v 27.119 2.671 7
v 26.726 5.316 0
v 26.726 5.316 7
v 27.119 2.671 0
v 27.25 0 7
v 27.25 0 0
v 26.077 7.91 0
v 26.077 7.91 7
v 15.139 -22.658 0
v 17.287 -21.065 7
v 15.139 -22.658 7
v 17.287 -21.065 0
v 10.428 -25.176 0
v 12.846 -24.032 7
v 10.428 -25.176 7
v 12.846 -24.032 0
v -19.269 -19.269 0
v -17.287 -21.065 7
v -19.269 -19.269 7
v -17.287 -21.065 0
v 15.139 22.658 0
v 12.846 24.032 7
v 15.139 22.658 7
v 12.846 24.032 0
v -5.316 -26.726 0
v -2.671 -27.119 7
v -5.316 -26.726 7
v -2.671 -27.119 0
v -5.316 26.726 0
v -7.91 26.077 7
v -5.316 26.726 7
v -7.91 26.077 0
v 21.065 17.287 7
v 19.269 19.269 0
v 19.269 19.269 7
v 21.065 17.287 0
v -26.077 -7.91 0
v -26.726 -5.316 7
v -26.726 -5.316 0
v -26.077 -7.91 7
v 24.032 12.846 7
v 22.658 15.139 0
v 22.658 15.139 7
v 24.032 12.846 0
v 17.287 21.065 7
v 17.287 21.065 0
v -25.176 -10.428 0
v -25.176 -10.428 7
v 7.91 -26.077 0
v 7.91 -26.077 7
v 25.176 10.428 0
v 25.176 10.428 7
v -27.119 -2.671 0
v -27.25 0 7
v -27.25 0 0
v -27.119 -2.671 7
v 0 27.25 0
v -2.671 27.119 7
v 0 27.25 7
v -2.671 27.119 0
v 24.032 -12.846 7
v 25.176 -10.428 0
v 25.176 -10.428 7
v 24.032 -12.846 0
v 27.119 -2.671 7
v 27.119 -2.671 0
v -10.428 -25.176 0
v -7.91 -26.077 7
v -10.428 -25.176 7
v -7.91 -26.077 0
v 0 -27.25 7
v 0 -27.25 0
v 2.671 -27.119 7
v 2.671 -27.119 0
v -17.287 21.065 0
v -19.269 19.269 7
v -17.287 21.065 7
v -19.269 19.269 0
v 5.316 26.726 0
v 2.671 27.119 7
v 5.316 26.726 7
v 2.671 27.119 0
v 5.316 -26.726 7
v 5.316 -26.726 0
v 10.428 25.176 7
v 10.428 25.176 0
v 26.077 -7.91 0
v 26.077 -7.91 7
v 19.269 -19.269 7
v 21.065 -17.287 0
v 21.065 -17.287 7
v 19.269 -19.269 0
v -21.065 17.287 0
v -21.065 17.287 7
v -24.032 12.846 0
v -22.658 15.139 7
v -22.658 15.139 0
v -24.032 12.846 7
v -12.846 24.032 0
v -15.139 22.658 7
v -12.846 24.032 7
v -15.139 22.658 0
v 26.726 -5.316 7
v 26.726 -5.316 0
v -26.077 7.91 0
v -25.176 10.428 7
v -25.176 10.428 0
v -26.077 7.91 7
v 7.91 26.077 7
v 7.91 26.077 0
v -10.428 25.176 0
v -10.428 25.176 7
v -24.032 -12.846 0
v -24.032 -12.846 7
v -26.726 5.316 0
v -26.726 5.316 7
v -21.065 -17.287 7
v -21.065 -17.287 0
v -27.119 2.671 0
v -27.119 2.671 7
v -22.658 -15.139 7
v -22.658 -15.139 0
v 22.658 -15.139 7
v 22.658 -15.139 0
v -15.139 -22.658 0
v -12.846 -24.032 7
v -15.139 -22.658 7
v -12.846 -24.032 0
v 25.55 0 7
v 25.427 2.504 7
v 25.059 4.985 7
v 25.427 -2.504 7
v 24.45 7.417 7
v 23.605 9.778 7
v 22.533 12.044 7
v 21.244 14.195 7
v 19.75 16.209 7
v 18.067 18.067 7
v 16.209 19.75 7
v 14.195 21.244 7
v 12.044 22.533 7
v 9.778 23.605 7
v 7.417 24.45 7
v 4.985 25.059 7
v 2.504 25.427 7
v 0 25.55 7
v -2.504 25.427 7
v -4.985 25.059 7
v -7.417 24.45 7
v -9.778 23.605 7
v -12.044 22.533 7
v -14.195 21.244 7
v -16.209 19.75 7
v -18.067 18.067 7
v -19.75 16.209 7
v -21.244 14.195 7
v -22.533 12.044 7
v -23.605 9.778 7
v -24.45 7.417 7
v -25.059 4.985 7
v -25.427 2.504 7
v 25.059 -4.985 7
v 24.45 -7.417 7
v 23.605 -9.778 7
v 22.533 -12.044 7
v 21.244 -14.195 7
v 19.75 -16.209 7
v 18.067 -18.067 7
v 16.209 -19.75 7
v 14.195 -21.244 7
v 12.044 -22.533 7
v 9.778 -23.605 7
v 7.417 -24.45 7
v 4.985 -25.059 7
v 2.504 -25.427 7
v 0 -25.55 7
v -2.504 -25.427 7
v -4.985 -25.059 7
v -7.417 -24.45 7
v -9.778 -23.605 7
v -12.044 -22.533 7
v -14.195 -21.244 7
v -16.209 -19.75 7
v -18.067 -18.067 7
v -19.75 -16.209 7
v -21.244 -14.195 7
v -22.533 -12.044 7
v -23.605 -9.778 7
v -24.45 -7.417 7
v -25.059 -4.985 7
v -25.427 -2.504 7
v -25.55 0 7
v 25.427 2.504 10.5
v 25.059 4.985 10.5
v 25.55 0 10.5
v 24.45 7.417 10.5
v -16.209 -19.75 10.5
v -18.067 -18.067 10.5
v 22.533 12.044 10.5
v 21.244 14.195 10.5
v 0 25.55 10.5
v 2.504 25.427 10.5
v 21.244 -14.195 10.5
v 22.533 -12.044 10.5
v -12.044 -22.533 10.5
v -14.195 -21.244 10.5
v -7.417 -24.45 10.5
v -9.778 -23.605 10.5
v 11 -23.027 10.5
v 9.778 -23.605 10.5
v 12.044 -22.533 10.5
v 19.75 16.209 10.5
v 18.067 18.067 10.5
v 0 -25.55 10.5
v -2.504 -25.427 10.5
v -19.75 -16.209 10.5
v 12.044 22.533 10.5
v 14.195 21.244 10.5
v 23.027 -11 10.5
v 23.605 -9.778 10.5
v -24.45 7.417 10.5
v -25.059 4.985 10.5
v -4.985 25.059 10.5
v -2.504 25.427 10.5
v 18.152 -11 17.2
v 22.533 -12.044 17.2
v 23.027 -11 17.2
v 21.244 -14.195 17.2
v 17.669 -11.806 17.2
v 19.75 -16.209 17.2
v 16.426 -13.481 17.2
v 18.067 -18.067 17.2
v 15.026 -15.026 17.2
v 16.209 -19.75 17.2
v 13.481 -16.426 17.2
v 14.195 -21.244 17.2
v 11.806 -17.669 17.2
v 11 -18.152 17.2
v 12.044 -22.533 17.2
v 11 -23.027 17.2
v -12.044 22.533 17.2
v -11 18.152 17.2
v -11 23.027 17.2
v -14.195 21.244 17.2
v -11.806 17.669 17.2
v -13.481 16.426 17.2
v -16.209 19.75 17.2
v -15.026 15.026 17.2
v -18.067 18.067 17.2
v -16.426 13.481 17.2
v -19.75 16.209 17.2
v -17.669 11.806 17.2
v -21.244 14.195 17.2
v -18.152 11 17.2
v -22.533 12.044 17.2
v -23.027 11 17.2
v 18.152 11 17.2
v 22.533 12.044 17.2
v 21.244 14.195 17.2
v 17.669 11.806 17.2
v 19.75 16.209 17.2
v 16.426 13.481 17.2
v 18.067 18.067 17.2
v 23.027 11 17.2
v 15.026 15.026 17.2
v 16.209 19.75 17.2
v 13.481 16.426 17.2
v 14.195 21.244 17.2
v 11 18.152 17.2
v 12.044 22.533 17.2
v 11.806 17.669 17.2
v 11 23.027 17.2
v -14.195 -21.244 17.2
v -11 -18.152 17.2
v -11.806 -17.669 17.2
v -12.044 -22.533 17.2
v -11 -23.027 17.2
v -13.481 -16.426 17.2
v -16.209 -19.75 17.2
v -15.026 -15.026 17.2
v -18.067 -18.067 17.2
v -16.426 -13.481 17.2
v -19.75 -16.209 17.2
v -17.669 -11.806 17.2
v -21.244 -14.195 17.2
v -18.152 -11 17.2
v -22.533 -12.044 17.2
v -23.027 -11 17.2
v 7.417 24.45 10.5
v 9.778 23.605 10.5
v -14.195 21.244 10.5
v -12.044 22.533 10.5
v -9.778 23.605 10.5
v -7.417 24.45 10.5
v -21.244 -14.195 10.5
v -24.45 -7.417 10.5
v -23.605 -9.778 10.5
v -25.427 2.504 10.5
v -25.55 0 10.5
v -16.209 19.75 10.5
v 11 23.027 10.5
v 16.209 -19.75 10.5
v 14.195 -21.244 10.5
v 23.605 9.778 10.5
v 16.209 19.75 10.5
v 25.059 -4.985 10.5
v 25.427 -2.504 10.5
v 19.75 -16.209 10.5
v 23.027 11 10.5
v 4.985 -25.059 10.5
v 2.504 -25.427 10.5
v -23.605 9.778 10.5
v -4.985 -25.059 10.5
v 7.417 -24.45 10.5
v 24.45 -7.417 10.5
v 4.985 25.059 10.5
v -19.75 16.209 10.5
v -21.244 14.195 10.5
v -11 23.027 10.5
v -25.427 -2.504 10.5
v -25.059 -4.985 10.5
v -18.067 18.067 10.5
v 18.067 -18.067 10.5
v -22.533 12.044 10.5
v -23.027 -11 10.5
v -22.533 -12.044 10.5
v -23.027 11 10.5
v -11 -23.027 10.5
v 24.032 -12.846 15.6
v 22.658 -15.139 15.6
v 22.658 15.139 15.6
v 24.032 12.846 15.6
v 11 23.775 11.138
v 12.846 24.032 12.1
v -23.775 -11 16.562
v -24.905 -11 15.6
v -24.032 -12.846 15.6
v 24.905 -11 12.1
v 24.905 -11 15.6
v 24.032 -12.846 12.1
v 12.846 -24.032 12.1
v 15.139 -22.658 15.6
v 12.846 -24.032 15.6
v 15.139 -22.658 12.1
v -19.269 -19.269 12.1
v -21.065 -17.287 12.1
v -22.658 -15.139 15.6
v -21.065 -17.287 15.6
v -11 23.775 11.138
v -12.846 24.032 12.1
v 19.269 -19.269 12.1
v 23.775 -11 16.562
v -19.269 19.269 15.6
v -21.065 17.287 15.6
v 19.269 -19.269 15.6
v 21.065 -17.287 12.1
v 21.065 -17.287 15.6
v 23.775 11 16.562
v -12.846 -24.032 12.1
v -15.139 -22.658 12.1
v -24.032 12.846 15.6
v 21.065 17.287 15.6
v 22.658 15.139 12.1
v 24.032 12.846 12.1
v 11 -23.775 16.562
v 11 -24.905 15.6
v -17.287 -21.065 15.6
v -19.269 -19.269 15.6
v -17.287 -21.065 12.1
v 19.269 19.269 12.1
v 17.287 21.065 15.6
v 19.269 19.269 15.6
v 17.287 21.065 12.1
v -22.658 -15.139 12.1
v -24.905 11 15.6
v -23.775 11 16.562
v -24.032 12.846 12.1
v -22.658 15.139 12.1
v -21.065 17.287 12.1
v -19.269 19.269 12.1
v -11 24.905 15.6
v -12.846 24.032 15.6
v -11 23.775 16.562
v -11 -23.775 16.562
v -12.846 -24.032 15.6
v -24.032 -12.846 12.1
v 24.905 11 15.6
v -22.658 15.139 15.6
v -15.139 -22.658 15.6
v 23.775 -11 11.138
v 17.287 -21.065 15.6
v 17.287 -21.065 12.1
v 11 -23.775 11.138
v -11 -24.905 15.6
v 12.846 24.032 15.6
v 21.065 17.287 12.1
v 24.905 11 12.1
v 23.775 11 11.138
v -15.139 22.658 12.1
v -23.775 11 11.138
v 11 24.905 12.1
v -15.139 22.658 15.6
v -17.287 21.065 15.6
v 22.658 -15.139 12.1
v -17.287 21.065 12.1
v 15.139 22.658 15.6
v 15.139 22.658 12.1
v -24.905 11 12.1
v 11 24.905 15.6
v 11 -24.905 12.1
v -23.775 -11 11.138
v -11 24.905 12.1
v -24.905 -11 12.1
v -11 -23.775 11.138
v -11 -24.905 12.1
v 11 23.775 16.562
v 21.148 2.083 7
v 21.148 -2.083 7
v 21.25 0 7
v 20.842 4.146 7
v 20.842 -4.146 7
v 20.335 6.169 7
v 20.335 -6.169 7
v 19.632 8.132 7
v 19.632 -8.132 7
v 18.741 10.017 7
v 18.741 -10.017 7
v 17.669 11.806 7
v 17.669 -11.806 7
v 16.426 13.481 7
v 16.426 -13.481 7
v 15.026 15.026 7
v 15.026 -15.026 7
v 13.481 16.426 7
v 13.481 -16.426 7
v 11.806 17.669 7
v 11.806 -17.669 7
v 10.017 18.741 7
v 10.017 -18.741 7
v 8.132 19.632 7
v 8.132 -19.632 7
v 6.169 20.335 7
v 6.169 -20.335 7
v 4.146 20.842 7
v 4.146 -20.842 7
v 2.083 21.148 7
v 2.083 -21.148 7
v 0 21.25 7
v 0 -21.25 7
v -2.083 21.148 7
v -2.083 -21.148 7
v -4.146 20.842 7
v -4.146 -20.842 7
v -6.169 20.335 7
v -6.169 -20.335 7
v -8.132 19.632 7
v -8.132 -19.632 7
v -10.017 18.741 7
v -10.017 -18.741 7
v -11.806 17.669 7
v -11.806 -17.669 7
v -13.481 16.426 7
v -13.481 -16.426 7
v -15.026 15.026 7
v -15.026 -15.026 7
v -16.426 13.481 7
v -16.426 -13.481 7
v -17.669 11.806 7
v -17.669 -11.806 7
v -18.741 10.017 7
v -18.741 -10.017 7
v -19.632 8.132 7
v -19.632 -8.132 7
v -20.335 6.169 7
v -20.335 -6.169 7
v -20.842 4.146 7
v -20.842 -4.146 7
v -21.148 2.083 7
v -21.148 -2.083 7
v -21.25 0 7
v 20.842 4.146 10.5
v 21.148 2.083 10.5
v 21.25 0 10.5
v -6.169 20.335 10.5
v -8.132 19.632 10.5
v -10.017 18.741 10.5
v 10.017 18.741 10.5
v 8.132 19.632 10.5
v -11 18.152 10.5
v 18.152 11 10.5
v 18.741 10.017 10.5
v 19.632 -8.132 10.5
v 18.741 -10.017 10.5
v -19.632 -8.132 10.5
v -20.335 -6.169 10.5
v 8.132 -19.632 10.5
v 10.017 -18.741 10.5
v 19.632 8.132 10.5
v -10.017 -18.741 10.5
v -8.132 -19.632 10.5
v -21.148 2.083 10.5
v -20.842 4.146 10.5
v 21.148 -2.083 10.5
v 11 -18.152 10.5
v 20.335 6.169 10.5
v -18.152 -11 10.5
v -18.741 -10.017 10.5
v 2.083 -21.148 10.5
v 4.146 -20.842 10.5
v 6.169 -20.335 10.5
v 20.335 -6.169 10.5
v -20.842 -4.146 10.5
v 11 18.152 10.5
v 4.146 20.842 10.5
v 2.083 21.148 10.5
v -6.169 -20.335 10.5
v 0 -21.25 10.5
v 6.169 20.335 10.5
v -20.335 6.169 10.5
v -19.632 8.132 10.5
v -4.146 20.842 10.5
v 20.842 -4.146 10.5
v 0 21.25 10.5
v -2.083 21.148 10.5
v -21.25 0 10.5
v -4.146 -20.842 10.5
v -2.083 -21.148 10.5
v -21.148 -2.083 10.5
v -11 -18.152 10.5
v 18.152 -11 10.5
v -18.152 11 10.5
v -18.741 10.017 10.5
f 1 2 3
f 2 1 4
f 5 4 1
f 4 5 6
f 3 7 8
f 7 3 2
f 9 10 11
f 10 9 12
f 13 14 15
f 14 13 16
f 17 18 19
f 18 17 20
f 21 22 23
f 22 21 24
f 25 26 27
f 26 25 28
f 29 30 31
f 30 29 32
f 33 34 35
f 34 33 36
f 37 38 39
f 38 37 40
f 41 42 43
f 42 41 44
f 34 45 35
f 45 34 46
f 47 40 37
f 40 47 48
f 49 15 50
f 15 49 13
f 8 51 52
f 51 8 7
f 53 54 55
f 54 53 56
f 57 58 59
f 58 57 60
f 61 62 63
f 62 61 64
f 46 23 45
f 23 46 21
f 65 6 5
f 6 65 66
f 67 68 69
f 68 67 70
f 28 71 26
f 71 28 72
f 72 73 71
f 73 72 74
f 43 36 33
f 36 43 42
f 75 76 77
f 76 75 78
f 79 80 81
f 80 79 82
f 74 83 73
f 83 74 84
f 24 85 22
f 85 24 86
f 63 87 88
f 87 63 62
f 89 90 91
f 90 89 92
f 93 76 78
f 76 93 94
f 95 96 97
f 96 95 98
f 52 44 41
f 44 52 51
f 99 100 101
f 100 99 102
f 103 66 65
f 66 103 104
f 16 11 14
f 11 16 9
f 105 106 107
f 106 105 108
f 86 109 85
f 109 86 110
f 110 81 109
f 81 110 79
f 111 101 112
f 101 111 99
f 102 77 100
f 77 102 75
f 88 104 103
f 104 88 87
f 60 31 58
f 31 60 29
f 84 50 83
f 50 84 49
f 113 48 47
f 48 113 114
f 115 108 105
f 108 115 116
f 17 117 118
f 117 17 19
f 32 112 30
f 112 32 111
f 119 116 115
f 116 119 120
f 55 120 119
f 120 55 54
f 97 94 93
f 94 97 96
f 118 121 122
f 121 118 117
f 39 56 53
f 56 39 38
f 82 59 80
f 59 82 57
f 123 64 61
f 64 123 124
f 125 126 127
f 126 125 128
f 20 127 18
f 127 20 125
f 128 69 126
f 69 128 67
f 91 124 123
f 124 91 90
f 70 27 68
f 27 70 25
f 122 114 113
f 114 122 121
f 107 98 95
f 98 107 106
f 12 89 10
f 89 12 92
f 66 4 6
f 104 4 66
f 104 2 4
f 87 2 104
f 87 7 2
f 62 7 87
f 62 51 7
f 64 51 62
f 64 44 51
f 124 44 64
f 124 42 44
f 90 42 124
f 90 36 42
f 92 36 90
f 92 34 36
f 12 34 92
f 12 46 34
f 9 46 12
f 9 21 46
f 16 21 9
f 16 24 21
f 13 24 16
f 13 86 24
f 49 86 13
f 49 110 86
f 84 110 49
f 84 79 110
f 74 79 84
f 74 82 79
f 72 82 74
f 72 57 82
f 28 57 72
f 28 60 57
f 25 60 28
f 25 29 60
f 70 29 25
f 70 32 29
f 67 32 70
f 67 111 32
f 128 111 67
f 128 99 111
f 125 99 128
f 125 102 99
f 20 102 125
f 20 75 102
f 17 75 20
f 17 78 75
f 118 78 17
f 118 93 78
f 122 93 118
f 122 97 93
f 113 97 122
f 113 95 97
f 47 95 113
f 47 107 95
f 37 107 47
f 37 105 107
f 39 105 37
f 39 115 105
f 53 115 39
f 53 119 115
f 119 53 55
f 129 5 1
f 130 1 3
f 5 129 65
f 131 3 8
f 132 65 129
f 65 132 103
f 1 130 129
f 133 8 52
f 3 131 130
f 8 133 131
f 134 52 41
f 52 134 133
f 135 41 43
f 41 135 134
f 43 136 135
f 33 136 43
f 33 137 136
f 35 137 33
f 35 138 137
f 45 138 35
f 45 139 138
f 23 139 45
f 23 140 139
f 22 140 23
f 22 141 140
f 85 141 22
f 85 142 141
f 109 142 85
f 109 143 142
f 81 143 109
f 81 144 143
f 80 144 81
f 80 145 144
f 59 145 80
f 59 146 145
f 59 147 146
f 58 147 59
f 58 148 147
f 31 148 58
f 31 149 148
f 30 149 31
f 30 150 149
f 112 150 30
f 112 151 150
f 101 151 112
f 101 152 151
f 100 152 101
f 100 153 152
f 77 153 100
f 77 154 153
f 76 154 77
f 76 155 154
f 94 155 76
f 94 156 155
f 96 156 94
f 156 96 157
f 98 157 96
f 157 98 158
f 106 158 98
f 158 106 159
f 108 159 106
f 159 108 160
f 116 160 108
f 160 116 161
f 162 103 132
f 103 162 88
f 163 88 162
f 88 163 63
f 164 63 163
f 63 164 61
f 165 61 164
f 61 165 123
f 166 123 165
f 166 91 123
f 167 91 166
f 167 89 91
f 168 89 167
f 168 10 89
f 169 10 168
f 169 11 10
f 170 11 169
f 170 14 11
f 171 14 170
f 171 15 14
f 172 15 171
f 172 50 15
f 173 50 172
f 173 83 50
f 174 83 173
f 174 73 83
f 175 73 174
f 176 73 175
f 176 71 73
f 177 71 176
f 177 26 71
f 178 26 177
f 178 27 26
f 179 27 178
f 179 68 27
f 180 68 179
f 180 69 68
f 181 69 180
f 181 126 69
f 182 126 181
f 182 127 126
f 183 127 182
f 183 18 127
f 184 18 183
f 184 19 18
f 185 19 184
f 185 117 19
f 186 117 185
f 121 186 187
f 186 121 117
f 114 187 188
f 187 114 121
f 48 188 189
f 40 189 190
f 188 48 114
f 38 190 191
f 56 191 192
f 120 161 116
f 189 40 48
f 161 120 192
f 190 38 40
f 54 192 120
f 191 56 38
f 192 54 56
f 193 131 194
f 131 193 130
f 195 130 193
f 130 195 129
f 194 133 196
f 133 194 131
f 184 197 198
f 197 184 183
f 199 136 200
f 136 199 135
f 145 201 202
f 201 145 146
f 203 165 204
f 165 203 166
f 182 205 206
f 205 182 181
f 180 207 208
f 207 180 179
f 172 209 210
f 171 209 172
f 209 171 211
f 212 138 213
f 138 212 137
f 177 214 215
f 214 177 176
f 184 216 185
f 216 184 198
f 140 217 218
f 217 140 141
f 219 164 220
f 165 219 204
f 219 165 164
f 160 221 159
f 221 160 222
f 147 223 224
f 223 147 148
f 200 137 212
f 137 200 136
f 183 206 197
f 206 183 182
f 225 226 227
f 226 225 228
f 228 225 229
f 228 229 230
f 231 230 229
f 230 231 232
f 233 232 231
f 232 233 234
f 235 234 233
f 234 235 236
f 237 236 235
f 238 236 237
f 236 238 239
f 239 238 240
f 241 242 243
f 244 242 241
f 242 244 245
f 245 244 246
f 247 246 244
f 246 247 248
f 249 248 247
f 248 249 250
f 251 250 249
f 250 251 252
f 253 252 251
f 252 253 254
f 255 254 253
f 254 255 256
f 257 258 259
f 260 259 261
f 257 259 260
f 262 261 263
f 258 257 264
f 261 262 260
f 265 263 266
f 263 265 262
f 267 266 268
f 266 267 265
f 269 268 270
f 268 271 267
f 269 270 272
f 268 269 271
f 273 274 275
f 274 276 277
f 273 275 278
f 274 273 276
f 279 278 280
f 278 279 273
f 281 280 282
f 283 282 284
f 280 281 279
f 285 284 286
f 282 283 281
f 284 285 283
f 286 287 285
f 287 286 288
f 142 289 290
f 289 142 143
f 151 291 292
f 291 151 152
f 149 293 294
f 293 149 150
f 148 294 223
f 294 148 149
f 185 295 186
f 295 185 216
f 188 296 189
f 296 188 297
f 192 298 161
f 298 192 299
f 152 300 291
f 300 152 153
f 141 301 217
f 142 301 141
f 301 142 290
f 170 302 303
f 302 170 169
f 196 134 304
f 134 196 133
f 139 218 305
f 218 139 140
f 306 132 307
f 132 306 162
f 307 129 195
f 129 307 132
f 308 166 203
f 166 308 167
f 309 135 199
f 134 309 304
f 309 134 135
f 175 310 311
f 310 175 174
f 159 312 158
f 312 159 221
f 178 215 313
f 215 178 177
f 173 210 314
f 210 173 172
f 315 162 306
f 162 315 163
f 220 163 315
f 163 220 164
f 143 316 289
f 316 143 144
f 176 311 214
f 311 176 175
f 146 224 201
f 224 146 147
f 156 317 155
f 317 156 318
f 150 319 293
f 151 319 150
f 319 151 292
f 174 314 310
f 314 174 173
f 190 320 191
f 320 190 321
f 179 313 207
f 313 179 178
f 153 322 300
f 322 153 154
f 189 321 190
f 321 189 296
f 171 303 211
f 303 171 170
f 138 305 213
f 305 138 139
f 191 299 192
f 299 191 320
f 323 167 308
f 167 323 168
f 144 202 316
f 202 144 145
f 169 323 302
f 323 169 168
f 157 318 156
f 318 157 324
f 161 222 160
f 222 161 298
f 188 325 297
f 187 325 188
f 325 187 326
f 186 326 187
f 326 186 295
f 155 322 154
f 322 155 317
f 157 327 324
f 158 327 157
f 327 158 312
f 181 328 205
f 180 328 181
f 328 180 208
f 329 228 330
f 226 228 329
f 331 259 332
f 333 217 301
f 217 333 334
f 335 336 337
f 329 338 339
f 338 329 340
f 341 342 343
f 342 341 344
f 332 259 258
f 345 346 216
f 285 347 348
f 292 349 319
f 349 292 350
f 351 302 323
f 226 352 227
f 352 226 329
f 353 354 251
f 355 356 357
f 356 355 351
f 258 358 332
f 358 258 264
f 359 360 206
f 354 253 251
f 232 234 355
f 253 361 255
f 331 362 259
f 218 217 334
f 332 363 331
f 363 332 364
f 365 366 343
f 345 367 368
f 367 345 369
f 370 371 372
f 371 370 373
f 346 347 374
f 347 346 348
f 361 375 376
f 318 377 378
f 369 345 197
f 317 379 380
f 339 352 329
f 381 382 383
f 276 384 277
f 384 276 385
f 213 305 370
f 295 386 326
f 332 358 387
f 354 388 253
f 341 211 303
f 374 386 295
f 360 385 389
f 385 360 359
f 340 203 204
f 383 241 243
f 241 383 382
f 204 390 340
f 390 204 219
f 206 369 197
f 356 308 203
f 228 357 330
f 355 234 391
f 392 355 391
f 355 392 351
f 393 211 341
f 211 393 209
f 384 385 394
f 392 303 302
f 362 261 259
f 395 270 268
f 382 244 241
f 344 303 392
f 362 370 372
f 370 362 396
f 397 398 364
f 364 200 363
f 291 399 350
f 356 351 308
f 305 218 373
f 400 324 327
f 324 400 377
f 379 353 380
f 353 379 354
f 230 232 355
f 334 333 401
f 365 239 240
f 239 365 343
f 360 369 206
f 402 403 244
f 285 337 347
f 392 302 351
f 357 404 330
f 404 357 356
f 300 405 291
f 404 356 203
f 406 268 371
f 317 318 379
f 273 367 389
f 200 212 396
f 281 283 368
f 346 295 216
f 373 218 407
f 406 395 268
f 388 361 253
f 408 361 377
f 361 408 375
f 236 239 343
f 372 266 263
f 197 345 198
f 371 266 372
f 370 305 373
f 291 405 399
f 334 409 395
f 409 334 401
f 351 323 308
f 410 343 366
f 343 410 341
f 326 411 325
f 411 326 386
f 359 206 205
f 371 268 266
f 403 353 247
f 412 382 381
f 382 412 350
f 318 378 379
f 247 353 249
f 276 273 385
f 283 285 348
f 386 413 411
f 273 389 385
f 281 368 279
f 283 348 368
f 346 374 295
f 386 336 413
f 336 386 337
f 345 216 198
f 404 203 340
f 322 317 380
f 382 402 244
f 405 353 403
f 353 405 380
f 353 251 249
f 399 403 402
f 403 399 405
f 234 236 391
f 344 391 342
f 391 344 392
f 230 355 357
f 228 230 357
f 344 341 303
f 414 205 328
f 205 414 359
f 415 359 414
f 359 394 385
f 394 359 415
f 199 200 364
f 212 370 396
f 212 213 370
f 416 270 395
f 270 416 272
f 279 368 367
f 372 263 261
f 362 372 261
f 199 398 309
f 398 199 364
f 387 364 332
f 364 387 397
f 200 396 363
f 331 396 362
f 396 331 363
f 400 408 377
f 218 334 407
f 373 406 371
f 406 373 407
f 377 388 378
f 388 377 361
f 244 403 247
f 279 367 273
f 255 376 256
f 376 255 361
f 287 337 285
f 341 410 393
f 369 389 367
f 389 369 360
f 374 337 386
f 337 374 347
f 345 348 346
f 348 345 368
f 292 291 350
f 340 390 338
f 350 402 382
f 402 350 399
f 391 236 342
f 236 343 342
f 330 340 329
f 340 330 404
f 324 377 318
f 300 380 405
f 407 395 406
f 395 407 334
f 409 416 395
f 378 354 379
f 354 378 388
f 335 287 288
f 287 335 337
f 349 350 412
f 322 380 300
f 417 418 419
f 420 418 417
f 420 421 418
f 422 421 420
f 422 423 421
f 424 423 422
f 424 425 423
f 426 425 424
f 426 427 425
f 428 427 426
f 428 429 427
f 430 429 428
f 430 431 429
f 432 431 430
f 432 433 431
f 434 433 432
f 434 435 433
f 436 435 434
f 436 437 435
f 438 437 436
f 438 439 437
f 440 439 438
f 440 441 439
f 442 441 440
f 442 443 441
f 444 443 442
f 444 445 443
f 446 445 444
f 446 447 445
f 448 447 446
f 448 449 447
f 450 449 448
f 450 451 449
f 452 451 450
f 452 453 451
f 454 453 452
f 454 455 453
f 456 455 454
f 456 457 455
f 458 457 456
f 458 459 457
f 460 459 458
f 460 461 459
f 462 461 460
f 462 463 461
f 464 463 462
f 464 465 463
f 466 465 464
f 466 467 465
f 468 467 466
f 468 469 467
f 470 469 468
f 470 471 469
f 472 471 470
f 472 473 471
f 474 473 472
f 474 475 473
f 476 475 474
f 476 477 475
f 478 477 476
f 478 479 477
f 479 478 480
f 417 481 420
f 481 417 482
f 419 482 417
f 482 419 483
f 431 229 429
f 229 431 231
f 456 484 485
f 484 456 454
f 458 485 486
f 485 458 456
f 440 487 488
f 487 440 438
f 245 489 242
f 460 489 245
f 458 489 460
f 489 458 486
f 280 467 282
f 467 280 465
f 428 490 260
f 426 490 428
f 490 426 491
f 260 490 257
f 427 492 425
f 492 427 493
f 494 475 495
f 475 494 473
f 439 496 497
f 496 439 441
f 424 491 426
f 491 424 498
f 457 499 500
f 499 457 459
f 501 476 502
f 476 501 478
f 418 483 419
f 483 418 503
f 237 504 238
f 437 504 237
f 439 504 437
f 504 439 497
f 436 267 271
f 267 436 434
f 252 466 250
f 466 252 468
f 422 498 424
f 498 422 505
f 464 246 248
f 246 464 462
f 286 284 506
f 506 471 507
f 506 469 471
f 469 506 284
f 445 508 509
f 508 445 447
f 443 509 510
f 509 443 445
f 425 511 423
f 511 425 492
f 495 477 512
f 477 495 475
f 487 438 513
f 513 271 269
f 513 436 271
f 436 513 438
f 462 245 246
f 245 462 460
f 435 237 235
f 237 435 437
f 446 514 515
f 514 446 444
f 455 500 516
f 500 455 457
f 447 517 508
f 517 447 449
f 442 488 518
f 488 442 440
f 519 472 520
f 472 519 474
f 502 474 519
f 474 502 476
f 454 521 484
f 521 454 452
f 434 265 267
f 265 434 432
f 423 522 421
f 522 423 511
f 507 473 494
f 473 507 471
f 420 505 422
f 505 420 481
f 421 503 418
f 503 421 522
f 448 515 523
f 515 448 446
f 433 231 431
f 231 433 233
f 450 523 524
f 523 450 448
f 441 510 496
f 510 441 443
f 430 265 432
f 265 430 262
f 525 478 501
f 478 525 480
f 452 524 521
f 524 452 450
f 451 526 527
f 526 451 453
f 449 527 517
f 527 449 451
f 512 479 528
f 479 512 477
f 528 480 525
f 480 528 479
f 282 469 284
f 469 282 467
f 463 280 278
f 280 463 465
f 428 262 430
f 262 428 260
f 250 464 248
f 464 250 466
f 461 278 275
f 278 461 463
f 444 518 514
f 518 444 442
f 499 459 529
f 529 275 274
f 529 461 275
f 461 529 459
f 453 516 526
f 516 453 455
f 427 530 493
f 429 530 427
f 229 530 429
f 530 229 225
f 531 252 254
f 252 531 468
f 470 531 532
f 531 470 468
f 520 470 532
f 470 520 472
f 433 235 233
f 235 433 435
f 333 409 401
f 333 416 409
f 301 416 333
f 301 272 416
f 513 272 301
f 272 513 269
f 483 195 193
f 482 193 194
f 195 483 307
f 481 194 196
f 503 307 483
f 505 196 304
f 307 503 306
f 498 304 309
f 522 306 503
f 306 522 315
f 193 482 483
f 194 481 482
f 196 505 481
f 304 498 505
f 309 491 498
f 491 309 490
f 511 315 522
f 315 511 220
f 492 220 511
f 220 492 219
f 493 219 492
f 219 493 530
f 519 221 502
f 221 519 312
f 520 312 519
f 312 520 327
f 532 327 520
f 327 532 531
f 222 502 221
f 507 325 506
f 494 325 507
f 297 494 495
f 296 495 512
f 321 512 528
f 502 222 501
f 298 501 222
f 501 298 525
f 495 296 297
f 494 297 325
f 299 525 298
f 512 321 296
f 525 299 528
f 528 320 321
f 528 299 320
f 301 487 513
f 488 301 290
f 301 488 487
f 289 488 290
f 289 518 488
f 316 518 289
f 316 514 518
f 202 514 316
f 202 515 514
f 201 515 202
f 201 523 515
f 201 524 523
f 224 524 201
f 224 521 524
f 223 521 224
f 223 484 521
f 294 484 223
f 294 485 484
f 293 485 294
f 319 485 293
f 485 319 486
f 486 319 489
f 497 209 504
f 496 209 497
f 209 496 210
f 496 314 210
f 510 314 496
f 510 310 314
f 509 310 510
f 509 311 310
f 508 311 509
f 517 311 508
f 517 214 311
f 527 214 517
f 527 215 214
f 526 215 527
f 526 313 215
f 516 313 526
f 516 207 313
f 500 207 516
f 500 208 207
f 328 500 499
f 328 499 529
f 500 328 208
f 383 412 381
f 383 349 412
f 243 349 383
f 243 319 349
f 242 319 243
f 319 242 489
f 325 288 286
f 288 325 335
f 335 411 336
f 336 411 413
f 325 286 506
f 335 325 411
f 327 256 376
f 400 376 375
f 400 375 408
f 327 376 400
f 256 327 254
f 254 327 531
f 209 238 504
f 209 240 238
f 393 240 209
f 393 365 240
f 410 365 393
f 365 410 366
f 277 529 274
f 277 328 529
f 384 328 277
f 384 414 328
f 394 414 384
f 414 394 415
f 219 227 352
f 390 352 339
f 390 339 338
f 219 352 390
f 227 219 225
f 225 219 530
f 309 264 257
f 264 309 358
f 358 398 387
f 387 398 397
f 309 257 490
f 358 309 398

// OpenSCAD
/*
Wheel Center Cover
http://www.thingiverse.com/thing:1232850/

By Paul Houghton
Twitter: @mobile_rat
Email: paulirotta@gmail.com
Blog: http://paul-houghton.com/

Creative Commons Attribution ShareAlike License
https://creativecommons.org/licenses/by-sa/4.0/legalcode
*/


/* [Wheel Center Cover Options] */


// Radius of the cap (outside dimension)
Cap_Radius = 27.25;
// Height of the cap (how far it sticks out from the wheel surface)
Cap_Height = 7;
// Radius of the riser between the cap and the wheel grips
Throat_Radius = 25.55;
// Height of the wheel grips
Grip_Height = 17.2;

// Difference between inside and outside radius of the throat and wheel grips
Thickness = 6;
center_radius = Cap_Radius - Thickness;
// Height between the cap and the grips
notch_offset = 3.5;
notch_height = Grip_Height - notch_offset - Cap_Height; // from notch radially outward
// Height of corner rounding
Notch_Bevel_Height = 1.6;
// Width of space between wheel grips
Cut_Width = 22;
// Number of facets to approximate a circle
$fn=64;



difference() {
	union() {
		color("red") cap();
        color("green") throat();
		color("blue") notch();
	}
	union() {
        center_cutout();
		cut(0);
		cut(90);
		cut(180);
		cut(270);
	}
}

module cap() {
    cylinder(r=Cap_Radius, h=Cap_Height);
}

module throat() {
    cylinder(r=Throat_Radius, h=Grip_Height);    
}

module center_cutout() {
    translate([0, 0, Cap_Height]) cylinder(r=center_radius, h=Grip_Height);    
}

module notch() {
    translate([0, 0, Cap_Height + notch_offset]) hull() {
        cylinder(r=Throat_Radius, h=notch_height);
        translate([0, 0, Notch_Bevel_Height]) cylinder(r=Cap_Radius, h=notch_height - 2*Notch_Bevel_Height);
    }
}

module cut(angle) {
	rotate([0, 0, angle]) {
        translate([-Cut_Width/2, 0, Cap_Height + notch_offset]) 
            cube([Cut_Width, 100, 100]);
	}
}

